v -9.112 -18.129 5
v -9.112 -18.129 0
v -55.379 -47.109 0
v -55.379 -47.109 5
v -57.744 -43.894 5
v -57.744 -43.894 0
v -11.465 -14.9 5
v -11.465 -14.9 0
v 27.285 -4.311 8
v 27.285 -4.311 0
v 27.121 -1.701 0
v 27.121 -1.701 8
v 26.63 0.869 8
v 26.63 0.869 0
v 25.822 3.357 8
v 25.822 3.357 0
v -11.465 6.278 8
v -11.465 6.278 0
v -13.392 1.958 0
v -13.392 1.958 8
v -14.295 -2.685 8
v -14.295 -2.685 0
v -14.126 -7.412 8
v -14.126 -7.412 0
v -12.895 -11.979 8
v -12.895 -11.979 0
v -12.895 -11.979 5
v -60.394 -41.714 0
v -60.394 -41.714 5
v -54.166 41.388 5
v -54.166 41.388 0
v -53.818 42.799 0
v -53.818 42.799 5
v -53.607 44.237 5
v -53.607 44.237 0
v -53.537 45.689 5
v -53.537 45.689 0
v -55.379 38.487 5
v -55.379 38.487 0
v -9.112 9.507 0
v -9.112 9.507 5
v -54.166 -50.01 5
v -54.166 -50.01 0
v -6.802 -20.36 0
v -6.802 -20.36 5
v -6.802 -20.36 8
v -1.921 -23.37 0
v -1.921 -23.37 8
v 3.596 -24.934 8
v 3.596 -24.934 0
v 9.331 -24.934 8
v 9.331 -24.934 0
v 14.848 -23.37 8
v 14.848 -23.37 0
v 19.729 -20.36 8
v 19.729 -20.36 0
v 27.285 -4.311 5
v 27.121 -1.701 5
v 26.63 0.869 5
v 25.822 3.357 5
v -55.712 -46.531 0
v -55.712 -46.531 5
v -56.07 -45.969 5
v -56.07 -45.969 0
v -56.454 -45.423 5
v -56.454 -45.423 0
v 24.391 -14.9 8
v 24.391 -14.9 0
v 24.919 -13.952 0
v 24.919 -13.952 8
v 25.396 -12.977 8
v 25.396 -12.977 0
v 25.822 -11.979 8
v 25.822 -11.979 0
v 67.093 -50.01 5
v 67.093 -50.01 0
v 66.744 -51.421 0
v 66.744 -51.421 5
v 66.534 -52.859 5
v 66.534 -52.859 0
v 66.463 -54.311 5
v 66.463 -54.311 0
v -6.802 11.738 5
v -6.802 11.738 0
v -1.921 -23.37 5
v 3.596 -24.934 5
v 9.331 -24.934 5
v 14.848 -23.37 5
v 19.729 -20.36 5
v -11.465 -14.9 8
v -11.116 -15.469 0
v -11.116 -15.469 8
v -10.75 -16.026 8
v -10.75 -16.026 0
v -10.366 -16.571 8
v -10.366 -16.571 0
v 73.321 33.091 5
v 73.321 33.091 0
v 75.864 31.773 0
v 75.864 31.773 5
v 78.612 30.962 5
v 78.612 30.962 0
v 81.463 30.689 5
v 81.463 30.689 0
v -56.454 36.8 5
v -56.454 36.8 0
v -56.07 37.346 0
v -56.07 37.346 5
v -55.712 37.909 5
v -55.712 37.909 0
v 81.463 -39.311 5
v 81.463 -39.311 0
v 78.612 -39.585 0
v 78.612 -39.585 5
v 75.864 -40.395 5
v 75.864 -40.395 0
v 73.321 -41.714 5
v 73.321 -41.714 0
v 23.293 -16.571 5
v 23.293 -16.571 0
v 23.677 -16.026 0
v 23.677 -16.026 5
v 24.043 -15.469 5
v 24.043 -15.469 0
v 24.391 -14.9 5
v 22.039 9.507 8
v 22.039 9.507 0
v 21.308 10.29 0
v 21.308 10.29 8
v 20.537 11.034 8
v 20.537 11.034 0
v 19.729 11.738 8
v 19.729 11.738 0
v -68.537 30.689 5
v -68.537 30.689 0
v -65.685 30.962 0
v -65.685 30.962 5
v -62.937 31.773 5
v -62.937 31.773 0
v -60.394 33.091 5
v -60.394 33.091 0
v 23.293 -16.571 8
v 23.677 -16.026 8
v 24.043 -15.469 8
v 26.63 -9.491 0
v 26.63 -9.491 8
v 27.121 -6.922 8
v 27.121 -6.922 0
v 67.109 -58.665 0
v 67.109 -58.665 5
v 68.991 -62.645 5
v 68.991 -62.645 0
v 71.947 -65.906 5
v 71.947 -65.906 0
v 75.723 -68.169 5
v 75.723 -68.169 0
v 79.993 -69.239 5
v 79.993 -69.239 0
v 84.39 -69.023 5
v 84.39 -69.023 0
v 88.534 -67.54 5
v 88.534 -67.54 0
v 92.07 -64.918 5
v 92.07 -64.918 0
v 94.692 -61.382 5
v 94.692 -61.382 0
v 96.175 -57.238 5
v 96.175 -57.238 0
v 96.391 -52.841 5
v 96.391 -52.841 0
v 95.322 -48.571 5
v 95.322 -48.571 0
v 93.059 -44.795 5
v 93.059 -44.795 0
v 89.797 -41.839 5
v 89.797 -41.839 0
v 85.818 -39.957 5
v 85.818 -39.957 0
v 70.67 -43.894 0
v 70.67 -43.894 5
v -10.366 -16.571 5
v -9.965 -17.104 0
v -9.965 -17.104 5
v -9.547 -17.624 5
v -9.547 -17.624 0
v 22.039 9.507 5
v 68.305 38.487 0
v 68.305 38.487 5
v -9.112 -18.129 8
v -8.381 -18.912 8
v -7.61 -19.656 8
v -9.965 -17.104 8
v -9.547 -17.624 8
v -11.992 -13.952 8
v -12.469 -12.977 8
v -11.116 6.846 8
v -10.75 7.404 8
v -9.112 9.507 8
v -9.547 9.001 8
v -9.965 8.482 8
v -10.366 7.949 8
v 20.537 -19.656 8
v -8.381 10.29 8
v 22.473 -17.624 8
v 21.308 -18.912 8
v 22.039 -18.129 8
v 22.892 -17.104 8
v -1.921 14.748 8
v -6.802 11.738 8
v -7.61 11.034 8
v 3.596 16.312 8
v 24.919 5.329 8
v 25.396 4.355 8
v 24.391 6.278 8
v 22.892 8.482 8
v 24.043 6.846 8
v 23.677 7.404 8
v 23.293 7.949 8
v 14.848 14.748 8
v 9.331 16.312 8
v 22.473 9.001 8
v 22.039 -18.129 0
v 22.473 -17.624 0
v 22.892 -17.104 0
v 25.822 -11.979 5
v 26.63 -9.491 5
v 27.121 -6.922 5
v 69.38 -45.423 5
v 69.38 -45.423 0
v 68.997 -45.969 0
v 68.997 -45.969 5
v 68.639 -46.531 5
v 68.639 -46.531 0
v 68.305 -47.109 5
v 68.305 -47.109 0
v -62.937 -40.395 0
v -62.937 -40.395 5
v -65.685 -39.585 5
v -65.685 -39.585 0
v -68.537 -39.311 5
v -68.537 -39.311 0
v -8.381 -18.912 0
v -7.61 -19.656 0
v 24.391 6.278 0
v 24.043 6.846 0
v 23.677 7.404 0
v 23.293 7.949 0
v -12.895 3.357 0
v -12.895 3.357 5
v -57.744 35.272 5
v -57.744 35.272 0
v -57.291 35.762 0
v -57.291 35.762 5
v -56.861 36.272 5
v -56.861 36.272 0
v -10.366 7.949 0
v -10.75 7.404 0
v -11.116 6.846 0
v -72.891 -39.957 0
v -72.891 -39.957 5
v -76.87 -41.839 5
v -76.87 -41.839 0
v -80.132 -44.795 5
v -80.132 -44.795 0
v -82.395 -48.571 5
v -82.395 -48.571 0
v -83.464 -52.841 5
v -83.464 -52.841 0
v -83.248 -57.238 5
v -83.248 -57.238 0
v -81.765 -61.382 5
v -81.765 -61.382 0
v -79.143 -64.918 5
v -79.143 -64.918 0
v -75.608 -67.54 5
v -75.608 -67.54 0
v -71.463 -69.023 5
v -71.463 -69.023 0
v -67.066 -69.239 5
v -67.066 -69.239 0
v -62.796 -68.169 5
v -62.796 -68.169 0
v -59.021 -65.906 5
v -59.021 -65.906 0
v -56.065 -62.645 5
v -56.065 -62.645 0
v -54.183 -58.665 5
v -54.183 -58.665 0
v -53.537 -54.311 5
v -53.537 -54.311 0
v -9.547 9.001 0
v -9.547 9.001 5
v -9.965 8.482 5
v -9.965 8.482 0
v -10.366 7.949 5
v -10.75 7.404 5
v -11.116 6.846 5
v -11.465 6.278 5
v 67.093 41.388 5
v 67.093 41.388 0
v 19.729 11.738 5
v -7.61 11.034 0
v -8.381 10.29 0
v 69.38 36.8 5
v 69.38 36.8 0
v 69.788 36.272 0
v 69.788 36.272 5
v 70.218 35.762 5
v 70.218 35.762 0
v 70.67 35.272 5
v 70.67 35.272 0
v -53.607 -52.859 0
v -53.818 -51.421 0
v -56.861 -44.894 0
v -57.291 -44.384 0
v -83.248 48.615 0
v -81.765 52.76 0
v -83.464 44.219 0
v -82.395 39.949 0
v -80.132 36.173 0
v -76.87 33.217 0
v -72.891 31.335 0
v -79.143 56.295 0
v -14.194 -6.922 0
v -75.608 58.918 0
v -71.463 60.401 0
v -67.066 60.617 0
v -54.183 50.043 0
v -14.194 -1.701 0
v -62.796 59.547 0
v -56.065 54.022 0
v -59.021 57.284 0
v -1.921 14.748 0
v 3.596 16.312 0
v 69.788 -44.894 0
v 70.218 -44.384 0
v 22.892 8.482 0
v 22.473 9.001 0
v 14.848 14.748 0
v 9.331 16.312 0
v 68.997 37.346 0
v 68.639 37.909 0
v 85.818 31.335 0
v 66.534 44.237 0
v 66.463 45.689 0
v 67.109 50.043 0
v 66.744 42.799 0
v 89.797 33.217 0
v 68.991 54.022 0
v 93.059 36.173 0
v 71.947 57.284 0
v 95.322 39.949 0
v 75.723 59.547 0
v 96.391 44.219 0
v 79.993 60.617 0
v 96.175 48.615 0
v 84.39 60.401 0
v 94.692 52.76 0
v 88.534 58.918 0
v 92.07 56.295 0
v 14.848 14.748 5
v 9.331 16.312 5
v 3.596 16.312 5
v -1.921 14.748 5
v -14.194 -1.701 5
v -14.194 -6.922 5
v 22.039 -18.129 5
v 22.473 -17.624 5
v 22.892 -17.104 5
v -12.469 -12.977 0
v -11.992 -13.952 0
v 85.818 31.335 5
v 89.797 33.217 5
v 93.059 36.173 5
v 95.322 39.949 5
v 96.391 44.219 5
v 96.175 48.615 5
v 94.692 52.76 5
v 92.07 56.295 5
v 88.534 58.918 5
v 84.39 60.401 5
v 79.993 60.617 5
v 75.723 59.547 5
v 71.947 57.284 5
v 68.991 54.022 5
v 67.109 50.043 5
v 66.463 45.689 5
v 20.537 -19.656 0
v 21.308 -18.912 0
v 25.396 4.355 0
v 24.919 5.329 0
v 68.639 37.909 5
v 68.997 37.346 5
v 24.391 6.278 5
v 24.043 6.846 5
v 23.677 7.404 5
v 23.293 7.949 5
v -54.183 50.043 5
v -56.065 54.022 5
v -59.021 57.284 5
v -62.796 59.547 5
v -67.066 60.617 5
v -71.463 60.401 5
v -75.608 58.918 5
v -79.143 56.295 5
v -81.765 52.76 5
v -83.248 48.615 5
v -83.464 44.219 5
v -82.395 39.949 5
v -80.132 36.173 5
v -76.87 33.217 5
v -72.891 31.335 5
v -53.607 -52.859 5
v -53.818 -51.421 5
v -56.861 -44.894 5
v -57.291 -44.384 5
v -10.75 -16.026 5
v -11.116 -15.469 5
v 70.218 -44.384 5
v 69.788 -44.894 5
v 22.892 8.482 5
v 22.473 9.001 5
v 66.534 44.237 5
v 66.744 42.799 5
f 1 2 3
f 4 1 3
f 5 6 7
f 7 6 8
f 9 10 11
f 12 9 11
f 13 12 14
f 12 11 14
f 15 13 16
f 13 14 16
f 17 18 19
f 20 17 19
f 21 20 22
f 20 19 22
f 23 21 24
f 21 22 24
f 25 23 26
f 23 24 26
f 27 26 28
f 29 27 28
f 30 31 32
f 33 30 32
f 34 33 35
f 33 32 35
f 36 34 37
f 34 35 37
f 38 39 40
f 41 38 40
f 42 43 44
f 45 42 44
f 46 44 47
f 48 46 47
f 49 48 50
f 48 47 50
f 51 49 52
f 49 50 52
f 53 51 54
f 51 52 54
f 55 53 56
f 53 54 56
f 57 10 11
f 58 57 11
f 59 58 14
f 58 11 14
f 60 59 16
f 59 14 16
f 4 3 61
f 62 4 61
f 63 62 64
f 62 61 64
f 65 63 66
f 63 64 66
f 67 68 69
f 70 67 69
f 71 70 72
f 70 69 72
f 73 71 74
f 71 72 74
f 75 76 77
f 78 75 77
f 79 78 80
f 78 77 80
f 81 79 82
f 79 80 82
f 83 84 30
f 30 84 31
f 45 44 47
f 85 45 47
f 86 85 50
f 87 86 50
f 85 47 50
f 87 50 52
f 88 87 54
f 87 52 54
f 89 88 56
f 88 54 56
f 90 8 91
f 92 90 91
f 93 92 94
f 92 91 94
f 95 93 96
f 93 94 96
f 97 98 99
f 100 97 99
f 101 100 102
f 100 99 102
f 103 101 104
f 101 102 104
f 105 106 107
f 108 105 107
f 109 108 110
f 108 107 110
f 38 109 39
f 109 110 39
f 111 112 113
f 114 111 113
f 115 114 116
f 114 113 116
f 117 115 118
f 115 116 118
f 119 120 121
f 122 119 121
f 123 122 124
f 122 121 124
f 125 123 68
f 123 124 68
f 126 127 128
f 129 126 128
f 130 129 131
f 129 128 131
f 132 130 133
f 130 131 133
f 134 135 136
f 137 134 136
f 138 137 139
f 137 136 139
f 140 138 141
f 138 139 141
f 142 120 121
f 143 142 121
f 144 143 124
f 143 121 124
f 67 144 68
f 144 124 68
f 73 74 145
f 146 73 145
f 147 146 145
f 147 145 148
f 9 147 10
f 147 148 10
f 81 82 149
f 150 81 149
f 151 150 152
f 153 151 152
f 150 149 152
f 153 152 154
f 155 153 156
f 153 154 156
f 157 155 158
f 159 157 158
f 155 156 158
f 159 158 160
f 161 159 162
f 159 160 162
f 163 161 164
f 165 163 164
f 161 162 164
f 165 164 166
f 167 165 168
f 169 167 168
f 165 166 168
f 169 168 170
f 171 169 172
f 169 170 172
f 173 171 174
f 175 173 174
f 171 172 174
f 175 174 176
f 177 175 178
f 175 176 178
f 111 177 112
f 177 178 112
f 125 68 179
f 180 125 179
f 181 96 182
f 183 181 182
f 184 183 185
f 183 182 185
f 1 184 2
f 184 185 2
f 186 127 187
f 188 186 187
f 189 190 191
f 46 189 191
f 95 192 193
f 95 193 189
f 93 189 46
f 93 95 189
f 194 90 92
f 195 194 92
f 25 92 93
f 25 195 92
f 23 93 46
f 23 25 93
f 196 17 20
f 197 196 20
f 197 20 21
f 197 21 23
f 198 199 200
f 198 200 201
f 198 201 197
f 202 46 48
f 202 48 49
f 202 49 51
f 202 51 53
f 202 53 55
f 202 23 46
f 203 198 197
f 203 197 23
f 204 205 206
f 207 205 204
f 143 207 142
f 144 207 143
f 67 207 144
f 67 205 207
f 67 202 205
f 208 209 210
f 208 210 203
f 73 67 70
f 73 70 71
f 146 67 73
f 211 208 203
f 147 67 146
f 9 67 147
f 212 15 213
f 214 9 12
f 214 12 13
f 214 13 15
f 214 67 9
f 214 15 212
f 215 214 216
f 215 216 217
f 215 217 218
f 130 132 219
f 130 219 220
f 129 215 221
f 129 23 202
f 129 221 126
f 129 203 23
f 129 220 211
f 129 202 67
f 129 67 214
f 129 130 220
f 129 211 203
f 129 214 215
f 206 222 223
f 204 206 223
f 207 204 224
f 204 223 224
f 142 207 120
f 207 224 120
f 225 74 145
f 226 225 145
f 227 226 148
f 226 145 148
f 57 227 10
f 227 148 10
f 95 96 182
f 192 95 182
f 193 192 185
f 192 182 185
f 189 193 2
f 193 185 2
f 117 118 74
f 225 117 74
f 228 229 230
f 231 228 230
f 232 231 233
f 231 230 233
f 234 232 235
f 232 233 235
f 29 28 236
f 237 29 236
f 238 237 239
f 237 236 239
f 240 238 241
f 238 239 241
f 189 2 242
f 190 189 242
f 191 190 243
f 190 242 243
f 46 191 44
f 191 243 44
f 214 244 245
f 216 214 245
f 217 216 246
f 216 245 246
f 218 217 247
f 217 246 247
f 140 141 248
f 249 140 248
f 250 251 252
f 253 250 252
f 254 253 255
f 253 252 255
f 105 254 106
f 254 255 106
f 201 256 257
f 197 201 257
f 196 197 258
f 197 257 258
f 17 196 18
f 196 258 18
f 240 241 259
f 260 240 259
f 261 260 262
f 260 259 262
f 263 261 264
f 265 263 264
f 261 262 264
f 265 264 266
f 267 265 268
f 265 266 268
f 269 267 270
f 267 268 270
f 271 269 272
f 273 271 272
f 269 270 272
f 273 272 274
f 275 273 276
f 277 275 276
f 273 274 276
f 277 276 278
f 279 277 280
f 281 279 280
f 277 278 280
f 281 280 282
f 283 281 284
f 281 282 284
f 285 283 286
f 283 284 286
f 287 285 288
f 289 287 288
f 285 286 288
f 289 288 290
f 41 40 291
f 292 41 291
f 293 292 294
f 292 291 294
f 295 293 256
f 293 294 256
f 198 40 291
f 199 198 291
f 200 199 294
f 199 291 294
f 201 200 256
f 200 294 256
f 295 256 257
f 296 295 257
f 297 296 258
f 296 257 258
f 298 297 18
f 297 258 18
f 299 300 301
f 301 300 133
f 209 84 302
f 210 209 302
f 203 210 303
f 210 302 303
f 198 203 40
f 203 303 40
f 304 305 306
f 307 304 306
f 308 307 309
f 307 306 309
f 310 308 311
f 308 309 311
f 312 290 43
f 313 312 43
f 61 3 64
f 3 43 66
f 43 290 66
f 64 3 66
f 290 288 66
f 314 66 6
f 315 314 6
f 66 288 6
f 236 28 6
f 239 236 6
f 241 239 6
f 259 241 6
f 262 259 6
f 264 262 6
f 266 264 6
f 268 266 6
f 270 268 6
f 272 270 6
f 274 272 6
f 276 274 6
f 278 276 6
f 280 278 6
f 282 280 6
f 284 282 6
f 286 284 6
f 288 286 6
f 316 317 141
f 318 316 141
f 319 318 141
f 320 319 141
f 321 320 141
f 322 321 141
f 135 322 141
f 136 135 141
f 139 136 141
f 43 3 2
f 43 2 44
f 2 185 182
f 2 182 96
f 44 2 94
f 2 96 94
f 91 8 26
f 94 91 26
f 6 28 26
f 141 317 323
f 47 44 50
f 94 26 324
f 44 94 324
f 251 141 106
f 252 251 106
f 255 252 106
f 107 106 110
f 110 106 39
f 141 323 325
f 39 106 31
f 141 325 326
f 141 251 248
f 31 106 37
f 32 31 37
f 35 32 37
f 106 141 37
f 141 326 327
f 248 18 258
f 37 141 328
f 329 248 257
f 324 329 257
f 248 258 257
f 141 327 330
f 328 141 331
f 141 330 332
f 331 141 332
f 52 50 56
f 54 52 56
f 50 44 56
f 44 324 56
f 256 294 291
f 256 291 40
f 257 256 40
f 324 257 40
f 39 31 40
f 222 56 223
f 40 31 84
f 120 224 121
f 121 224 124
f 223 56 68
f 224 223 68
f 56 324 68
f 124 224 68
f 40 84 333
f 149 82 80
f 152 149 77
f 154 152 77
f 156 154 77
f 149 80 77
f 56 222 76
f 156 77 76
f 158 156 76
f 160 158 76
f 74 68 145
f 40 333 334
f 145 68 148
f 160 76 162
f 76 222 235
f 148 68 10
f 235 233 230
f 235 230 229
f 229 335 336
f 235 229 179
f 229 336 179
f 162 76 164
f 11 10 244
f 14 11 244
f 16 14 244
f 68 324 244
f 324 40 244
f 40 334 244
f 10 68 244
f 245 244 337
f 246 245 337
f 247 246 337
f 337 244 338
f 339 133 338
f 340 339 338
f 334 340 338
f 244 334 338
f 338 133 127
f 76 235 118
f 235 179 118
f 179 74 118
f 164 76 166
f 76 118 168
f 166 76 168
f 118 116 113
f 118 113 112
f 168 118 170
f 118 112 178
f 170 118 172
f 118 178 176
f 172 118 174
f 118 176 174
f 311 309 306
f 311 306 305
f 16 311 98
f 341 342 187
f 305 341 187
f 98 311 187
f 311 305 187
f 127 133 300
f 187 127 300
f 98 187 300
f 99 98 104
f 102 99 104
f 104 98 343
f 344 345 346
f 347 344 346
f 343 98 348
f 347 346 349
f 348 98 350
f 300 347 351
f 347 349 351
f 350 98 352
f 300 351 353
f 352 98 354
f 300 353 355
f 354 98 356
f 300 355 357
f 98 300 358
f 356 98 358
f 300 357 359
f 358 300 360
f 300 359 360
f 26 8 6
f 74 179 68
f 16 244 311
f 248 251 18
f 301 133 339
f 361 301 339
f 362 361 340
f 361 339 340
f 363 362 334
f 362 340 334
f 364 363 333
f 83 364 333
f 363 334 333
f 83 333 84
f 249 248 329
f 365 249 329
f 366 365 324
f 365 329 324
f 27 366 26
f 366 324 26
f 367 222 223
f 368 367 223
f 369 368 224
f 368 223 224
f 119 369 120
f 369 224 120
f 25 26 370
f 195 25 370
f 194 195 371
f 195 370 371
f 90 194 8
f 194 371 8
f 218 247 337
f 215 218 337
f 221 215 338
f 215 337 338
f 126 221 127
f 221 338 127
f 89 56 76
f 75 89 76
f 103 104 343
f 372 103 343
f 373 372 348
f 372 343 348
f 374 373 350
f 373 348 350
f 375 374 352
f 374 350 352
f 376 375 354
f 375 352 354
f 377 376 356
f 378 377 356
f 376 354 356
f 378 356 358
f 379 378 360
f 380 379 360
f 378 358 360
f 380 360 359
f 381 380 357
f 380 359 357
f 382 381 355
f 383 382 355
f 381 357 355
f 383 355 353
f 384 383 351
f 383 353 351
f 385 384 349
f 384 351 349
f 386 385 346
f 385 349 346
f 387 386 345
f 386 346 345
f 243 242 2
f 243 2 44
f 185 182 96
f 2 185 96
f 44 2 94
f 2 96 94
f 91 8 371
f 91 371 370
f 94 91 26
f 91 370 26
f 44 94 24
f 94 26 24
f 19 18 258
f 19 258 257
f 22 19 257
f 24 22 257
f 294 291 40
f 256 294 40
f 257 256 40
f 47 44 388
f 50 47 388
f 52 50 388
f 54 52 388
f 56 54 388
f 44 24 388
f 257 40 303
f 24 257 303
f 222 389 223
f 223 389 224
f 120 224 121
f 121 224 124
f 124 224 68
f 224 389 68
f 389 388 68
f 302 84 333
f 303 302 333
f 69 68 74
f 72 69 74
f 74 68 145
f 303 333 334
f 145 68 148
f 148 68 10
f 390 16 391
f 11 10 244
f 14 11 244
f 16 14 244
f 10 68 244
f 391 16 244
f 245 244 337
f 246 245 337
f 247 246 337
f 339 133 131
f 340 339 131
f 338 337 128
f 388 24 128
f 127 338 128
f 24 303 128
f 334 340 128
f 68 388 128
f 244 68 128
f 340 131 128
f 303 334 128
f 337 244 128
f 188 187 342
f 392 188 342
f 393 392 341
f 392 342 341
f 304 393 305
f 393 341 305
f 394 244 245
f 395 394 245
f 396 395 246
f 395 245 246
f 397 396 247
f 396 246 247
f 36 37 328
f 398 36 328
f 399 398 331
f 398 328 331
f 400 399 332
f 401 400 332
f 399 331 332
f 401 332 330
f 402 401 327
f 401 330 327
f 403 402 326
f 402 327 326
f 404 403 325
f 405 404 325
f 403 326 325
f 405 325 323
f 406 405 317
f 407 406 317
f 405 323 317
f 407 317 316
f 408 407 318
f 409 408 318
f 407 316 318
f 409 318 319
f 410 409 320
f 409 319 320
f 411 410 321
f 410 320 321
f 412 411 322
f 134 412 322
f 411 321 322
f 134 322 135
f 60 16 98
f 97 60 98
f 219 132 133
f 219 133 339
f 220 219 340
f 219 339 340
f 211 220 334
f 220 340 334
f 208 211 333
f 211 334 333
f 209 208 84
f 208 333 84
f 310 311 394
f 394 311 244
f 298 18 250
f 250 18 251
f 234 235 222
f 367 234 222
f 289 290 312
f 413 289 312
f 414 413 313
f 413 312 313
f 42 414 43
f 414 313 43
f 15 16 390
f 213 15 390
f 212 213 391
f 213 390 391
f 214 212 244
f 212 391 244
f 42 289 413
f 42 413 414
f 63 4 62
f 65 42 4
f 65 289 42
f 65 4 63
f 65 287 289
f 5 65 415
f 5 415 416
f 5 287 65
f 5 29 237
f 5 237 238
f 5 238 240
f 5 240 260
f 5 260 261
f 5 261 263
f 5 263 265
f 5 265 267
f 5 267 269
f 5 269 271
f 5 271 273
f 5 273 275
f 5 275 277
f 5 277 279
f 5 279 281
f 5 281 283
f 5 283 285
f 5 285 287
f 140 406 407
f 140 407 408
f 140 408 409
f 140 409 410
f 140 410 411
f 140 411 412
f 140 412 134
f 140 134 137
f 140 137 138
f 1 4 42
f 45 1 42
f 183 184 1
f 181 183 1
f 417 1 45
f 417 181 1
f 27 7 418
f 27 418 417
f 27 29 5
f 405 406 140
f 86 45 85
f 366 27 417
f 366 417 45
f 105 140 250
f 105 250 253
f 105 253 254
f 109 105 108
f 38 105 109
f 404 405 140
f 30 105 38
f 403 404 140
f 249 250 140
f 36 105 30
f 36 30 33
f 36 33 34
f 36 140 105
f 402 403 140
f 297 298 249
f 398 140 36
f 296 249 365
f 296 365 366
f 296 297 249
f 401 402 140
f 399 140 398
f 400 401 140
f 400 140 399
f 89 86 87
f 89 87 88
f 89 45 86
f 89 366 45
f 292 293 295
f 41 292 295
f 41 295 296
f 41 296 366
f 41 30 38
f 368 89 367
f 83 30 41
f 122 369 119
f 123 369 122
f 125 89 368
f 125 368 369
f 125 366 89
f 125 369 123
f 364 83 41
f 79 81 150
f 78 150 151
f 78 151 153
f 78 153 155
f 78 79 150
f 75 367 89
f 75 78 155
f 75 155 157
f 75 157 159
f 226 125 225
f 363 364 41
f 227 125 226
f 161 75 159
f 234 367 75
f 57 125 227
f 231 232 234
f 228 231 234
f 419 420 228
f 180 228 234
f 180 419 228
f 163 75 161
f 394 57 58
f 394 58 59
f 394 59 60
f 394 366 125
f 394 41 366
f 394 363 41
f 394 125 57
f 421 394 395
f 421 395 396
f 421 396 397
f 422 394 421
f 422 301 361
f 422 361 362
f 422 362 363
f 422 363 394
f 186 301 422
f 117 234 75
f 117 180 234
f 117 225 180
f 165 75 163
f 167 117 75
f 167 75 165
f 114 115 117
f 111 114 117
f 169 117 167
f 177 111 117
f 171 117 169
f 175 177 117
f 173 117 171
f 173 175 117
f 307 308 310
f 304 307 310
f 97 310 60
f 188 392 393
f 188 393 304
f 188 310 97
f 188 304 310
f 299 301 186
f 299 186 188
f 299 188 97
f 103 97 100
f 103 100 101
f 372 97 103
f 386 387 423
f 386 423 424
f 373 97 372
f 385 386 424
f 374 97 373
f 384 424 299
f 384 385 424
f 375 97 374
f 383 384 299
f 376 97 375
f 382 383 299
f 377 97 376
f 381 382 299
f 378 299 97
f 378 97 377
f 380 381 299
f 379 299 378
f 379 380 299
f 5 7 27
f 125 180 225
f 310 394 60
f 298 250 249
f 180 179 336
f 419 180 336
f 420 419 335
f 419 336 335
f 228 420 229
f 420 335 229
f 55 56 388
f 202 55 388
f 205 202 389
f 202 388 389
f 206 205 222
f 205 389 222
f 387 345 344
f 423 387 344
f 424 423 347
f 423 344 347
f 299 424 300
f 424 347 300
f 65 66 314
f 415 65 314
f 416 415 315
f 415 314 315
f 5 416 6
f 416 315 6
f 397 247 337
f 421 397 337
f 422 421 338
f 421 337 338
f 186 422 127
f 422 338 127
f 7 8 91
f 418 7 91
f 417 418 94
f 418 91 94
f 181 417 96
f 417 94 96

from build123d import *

# Parameters (mm, degrees)
F1_DEPTH = 8
F2_DEPTH = 5


with BuildPart() as f1:
    # F0 (on Top) → F1 (new body)
    with BuildSketch(Plane.XY):
        with BuildLine():
            ThreePointArc((25.8218274264, -11.9788249413), (26.9159887383, -8.214169835), (27.285070702, -4.3111459369))
            ThreePointArc((27.285070702, -4.3111459369), (26.9159887383, -0.4081220387), (25.8218274264, 3.3565330675))
            ThreePointArc((25.8218274264, 3.3565330675), (25.163790077, 4.8451330019), (24.3914933518, 6.2777881196))
            ThreePointArc((24.3914933518, 6.2777881196), (23.8622519529, 7.1265995546), (23.2928555336, 7.9490137011))
            ThreePointArc((23.2928555336, 7.9490137011), (22.6846182097, 8.7431325011), (22.0389437384, 9.5071231998))
            ThreePointArc((22.0389437384, 9.5071231998), (20.9271256495, 10.6669312969), (19.7291910596, 11.7375605526))
            ThreePointArc((19.7291910596, 11.7375605526), (6.463385336, 16.5105394291), (-6.8024203875, 11.7375605526))
            ThreePointArc((-6.8024203875, 11.7375605526), (-8.0003549775, 10.6669312969), (-9.1121730663, 9.5071231998))
            ThreePointArc((-9.1121730663, 9.5071231998), (-9.7578475377, 8.7431325011), (-10.3660848615, 7.9490137011))
            ThreePointArc((-10.3660848615, 7.9490137011), (-10.9354812808, 7.1265995546), (-11.4647226798, 6.2777881196))
            ThreePointArc((-11.4647226798, 6.2777881196), (-12.2370194049, 4.8451330019), (-12.8950567543, 3.3565330675))
            ThreePointArc((-12.8950567543, 3.3565330675), (-14.3583000299, -4.3111459369), (-12.8950567543, -11.9788249413))
            ThreePointArc((-12.8950567543, -11.9788249413), (-12.2370194049, -13.4674248757), (-11.4647226798, -14.9000799934))
            ThreePointArc((-11.4647226798, -14.9000799934), (-10.9354812808, -15.7488914284), (-10.3660848615, -16.5713055749))
            ThreePointArc((-10.3660848615, -16.5713055749), (-9.7578475377, -17.3654243749), (-9.1121730663, -18.1294150736))
            ThreePointArc((-9.1121730663, -18.1294150736), (-8.0003549775, -19.2892231707), (-6.8024203875, -20.3598524263))
            ThreePointArc((-6.8024203875, -20.3598524263), (6.463385336, -25.1328313029), (19.7291910596, -20.3598524263))
            ThreePointArc((19.7291910596, -20.3598524263), (20.9271256495, -19.2892231707), (22.0389437384, -18.1294150736))
            ThreePointArc((22.0389437384, -18.1294150736), (22.6846182097, -17.3654243749), (23.2928555336, -16.5713055749))
            ThreePointArc((23.2928555336, -16.5713055749), (23.8622519529, -15.7488914284), (24.3914933518, -14.9000799934))
            ThreePointArc((24.3914933518, -14.9000799934), (25.163790077, -13.4674248757), (25.8218274264, -11.9788249413))
        make_face()
    extrude(amount=F1_DEPTH)


with BuildPart() as f2:
    # F0 (on Top) → F2 (new body)
    with BuildSketch(Plane.XY):
        with BuildLine():
            ThreePointArc((24.3914933518, 6.2777881196), (25.163790077, 4.8451330019), (25.8218274264, 3.3565330675))
            Line((25.8218274264, 3.3565330675), (73.3206508225, 33.0913989772))
            ThreePointArc((73.3206508225, 33.0913989772), (71.9329417181, 34.105648788), (70.6703753539, 35.2719958263))
            Line((70.6703753539, 35.2719958263), (24.3914933518, 6.2777881196))
        make_face()
        with BuildLine():
            ThreePointArc((19.7291910596, 11.7375605526), (20.9271256495, 10.6669312969), (22.0389437384, 9.5071231998))
            Line((22.0389437384, 9.5071231998), (68.3054091022, 38.4869333867))
            ThreePointArc((68.3054091022, 38.4869333867), (67.6230720145, 39.9056259712), (67.0931796762, 41.38801818))
            Line((67.0931796762, 41.38801818), (19.7291910596, 11.7375605526))
        make_face()
        with BuildLine():
            Line((81.463385336, 38.1888540631), (81.463385336, 30.6888540631))
            ThreePointArc((81.463385336, 30.6888540631), (92.0699870538, 35.0822523453), (96.463385336, 45.6888540631))
            ThreePointArc((96.463385336, 45.6888540631), (81.463385336, 60.6888540631), (66.463385336, 45.6888540631))
            Line((66.463385336, 45.6888540631), (73.963385336, 45.6888540631))
            Line((73.963385336, 45.6888540631), (81.463385336, 45.6888540631))
            Line((81.463385336, 45.6888540631), (81.463385336, 38.1888540631))
        make_face()
        with BuildLine():
            ThreePointArc((70.6703753539, 35.2719958263), (71.9329417181, 34.105648788), (73.3206508225, 33.0913989772))
            Line((73.3206508225, 33.0913989772), (81.463385336, 38.1888540631))
            Line((81.463385336, 38.1888540631), (81.463385336, 45.6888540631))
            Line((81.463385336, 45.6888540631), (73.963385336, 45.6888540631))
            Line((73.963385336, 45.6888540631), (67.0931796762, 41.38801818))
            ThreePointArc((67.0931796762, 41.38801818), (67.6230720145, 39.9056259712), (68.3054091022, 38.4869333867))
            ThreePointArc((68.3054091022, 38.4869333867), (68.8148096557, 37.6257570614), (69.3804887024, 36.8004566293))
            ThreePointArc((69.3804887024, 36.8004566293), (69.9999293135, 36.0147041769), (70.6703753539, 35.2719958263))
        make_face()
        with BuildLine():
            Line((81.463385336, 38.1888540631), (73.3206508225, 33.0913989772))
            ThreePointArc((73.3206508225, 33.0913989772), (77.2184958374, 31.3020228225), (81.463385336, 30.6888540631))
            Line((81.463385336, 30.6888540631), (81.463385336, 38.1888540631))
        make_face()
        with BuildLine():
            Line((73.963385336, 45.6888540631), (66.463385336, 45.6888540631))
            ThreePointArc((66.463385336, 45.6888540631), (66.6216690455, 43.5155023771), (67.0931796762, 41.38801818))
            Line((67.0931796762, 41.38801818), (73.963385336, 45.6888540631))
        make_face()
        with BuildLine():
            Line((-61.036614664, 45.6888540631), (-53.536614664, 45.6888540631))
            ThreePointArc((-53.536614664, 45.6888540631), (-79.1432163818, 56.2954557809), (-68.536614664, 30.6888540631))
            Line((-68.536614664, 30.6888540631), (-68.536614664, 38.1888540631))
            Line((-68.536614664, 38.1888540631), (-68.536614664, 45.6888540631))
            Line((-68.536614664, 45.6888540631), (-61.036614664, 45.6888540631))
        make_face()
        with BuildLine():
            ThreePointArc((-55.3786384301, 38.4869333867), (-54.6963013425, 39.9056259712), (-54.1664090041, 41.38801818))
            Line((-54.1664090041, 41.38801818), (-61.036614664, 45.6888540631))
            Line((-61.036614664, 45.6888540631), (-68.536614664, 45.6888540631))
            Line((-68.536614664, 45.6888540631), (-68.536614664, 38.1888540631))
            Line((-68.536614664, 38.1888540631), (-60.3938801505, 33.0913989772))
            ThreePointArc((-60.3938801505, 33.0913989772), (-59.006171046, 34.105648788), (-57.7436046819, 35.2719958263))
            ThreePointArc((-57.7436046819, 35.2719958263), (-57.0731586415, 36.0147041769), (-56.4537180304, 36.8004566293))
            ThreePointArc((-56.4537180304, 36.8004566293), (-55.8880389836, 37.6257570614), (-55.3786384301, 38.4869333867))
        make_face()
        with BuildLine():
            ThreePointArc((-54.1664090041, 41.38801818), (-53.6948983734, 43.5155023771), (-53.536614664, 45.6888540631))
            Line((-53.536614664, 45.6888540631), (-61.036614664, 45.6888540631))
            Line((-61.036614664, 45.6888540631), (-54.1664090041, 41.38801818))
        make_face()
        with BuildLine():
            Line((-68.536614664, 38.1888540631), (-68.536614664, 30.6888540631))
            ThreePointArc((-68.536614664, 30.6888540631), (-64.2917251654, 31.3020228225), (-60.3938801505, 33.0913989772))
            Line((-60.3938801505, 33.0913989772), (-68.536614664, 38.1888540631))
        make_face()
        with BuildLine():
            ThreePointArc((-57.7436046819, 35.2719958263), (-59.006171046, 34.105648788), (-60.3938801505, 33.0913989772))
            Line((-60.3938801505, 33.0913989772), (-12.8950567543, 3.3565330675))
            ThreePointArc((-12.8950567543, 3.3565330675), (-12.2370194049, 4.8451330019), (-11.4647226798, 6.2777881196))
            Line((-11.4647226798, 6.2777881196), (-57.7436046819, 35.2719958263))
        make_face()
        with BuildLine():
            ThreePointArc((-9.1121730663, 9.5071231998), (-8.0003549775, 10.6669312969), (-6.8024203875, 11.7375605526))
            Line((-6.8024203875, 11.7375605526), (-54.1664090041, 41.38801818))
            ThreePointArc((-54.1664090041, 41.38801818), (-54.6963013425, 39.9056259712), (-55.3786384301, 38.4869333867))
            Line((-55.3786384301, 38.4869333867), (-9.1121730663, 9.5071231998))
        make_face()
        with BuildLine():
            ThreePointArc((25.8218274264, -11.9788249413), (26.9159887383, -8.214169835), (27.285070702, -4.3111459369))
            ThreePointArc((27.285070702, -4.3111459369), (26.9159887383, -0.4081220387), (25.8218274264, 3.3565330675))
            ThreePointArc((25.8218274264, 3.3565330675), (25.163790077, 4.8451330019), (24.3914933518, 6.2777881196))
            ThreePointArc((24.3914933518, 6.2777881196), (23.8622519529, 7.1265995546), (23.2928555336, 7.9490137011))
            ThreePointArc((23.2928555336, 7.9490137011), (22.6846182097, 8.7431325011), (22.0389437384, 9.5071231998))
            ThreePointArc((22.0389437384, 9.5071231998), (20.9271256495, 10.6669312969), (19.7291910596, 11.7375605526))
            ThreePointArc((19.7291910596, 11.7375605526), (6.463385336, 16.5105394291), (-6.8024203875, 11.7375605526))
            ThreePointArc((-6.8024203875, 11.7375605526), (-8.0003549775, 10.6669312969), (-9.1121730663, 9.5071231998))
            ThreePointArc((-9.1121730663, 9.5071231998), (-9.7578475377, 8.7431325011), (-10.3660848615, 7.9490137011))
            ThreePointArc((-10.3660848615, 7.9490137011), (-10.9354812808, 7.1265995546), (-11.4647226798, 6.2777881196))
            ThreePointArc((-11.4647226798, 6.2777881196), (-12.2370194049, 4.8451330019), (-12.8950567543, 3.3565330675))
            ThreePointArc((-12.8950567543, 3.3565330675), (-14.3583000299, -4.3111459369), (-12.8950567543, -11.9788249413))
            ThreePointArc((-12.8950567543, -11.9788249413), (-12.2370194049, -13.4674248757), (-11.4647226798, -14.9000799934))
            ThreePointArc((-11.4647226798, -14.9000799934), (-10.9354812808, -15.7488914284), (-10.3660848615, -16.5713055749))
            ThreePointArc((-10.3660848615, -16.5713055749), (-9.7578475377, -17.3654243749), (-9.1121730663, -18.1294150736))
            ThreePointArc((-9.1121730663, -18.1294150736), (-8.0003549775, -19.2892231707), (-6.8024203875, -20.3598524263))
            ThreePointArc((-6.8024203875, -20.3598524263), (6.463385336, -25.1328313029), (19.7291910596, -20.3598524263))
            ThreePointArc((19.7291910596, -20.3598524263), (20.9271256495, -19.2892231707), (22.0389437384, -18.1294150736))
            ThreePointArc((22.0389437384, -18.1294150736), (22.6846182097, -17.3654243749), (23.2928555336, -16.5713055749))
            ThreePointArc((23.2928555336, -16.5713055749), (23.8622519529, -15.7488914284), (24.3914933518, -14.9000799934))
            ThreePointArc((24.3914933518, -14.9000799934), (25.163790077, -13.4674248757), (25.8218274264, -11.9788249413))
        make_face()
        with BuildLine():
            Line((-12.8950567543, -11.9788249413), (-60.3938801505, -41.7136908509))
            ThreePointArc((-60.3938801505, -41.7136908509), (-59.006171046, -42.7279406618), (-57.7436046819, -43.8942877001))
            Line((-57.7436046819, -43.8942877001), (-11.4647226798, -14.9000799934))
            ThreePointArc((-11.4647226798, -14.9000799934), (-12.2370194049, -13.4674248757), (-12.8950567543, -11.9788249413))
        make_face()
        with BuildLine():
            Line((-54.1664090041, -50.0103100538), (-6.8024203875, -20.3598524263))
            ThreePointArc((-6.8024203875, -20.3598524263), (-8.0003549775, -19.2892231707), (-9.1121730663, -18.1294150736))
            Line((-9.1121730663, -18.1294150736), (-55.3786384301, -47.1092252605))
            ThreePointArc((-55.3786384301, -47.1092252605), (-54.6963013425, -48.527917845), (-54.1664090041, -50.0103100538))
        make_face()
        with BuildLine():
            Line((68.3054091022, -47.1092252605), (22.0389437384, -18.1294150736))
            ThreePointArc((22.0389437384, -18.1294150736), (20.9271256495, -19.2892231707), (19.7291910596, -20.3598524263))
            Line((19.7291910596, -20.3598524263), (67.0931796762, -50.0103100538))
            ThreePointArc((67.0931796762, -50.0103100538), (67.6230720145, -48.527917845), (68.3054091022, -47.1092252605))
        make_face()
        with BuildLine():
            Line((73.3206508225, -41.713690851), (25.8218274264, -11.9788249413))
            ThreePointArc((25.8218274264, -11.9788249413), (25.163790077, -13.4674248757), (24.3914933518, -14.9000799934))
            Line((24.3914933518, -14.9000799934), (70.6703753539, -43.8942877001))
            ThreePointArc((70.6703753539, -43.8942877001), (71.9329417181, -42.7279406618), (73.3206508225, -41.7136908509))
        make_face()
        with BuildLine():
            ThreePointArc((96.463385336, -54.3111459369), (92.0699870538, -43.7045442191), (81.463385336, -39.3111459369))
            Line((81.463385336, -39.3111459369), (81.463385336, -46.8111459369))
            Line((81.463385336, -46.8111459369), (81.463385336, -54.3111459369))
            Line((81.463385336, -54.3111459369), (73.963385336, -54.3111459369))
            Line((73.963385336, -54.3111459369), (66.463385336, -54.3111459369))
            ThreePointArc((66.463385336, -54.3111459369), (81.463385336, -69.3111459369), (96.463385336, -54.3111459369))
        make_face()
        with BuildLine():
            Line((81.463385336, -46.8111459369), (73.3206508225, -41.713690851))
            ThreePointArc((73.3206508225, -41.7136908509), (71.9329417181, -42.7279406618), (70.6703753539, -43.8942877001))
            ThreePointArc((70.6703753539, -43.8942877001), (69.9999293135, -44.6369960507), (69.3804887024, -45.4227485031))
            ThreePointArc((69.3804887024, -45.4227485031), (68.8148096557, -46.2480489352), (68.3054091022, -47.1092252605))
            ThreePointArc((68.3054091022, -47.1092252605), (67.6230720145, -48.527917845), (67.0931796762, -50.0103100538))
            Line((67.0931796762, -50.0103100538), (73.963385336, -54.3111459369))
            Line((73.963385336, -54.3111459369), (81.463385336, -54.3111459369))
            Line((81.463385336, -54.3111459369), (81.463385336, -46.8111459369))
        make_face()
        with BuildLine():
            ThreePointArc((81.463385336, -39.3111459369), (77.2184958374, -39.9243146963), (73.3206508225, -41.7136908509))
            Line((73.3206508225, -41.713690851), (81.463385336, -46.8111459369))
            Line((81.463385336, -46.8111459369), (81.463385336, -39.3111459369))
        make_face()
        with BuildLine():
            ThreePointArc((67.0931796762, -50.0103100538), (66.6216690455, -52.1377942509), (66.463385336, -54.3111459369))
            Line((66.463385336, -54.3111459369), (73.963385336, -54.3111459369))
            Line((73.963385336, -54.3111459369), (67.0931796762, -50.0103100538))
        make_face()
        with BuildLine():
            ThreePointArc((-68.536614664, -39.3111459369), (-79.1432163818, -64.9177476547), (-53.536614664, -54.3111459369))
            Line((-53.536614664, -54.3111459369), (-61.036614664, -54.3111459369))
            Line((-61.036614664, -54.3111459369), (-68.536614664, -54.3111459369))
            Line((-68.536614664, -54.3111459369), (-68.536614664, -46.8111459369))
            Line((-68.536614664, -46.8111459369), (-68.536614664, -39.3111459369))
        make_face()
        with BuildLine():
            Line((-61.036614664, -54.3111459369), (-54.1664090041, -50.0103100538))
            ThreePointArc((-54.1664090041, -50.0103100538), (-54.6963013425, -48.527917845), (-55.3786384301, -47.1092252605))
            ThreePointArc((-55.3786384301, -47.1092252605), (-55.8880389836, -46.2480489352), (-56.4537180304, -45.4227485031))
            ThreePointArc((-56.4537180304, -45.4227485031), (-57.0731586415, -44.6369960507), (-57.7436046819, -43.8942877001))
            ThreePointArc((-57.7436046819, -43.8942877001), (-59.006171046, -42.7279406618), (-60.3938801505, -41.7136908509))
            Line((-60.3938801505, -41.7136908509), (-68.536614664, -46.8111459369))
            Line((-68.536614664, -46.8111459369), (-68.536614664, -54.3111459369))
            Line((-68.536614664, -54.3111459369), (-61.036614664, -54.3111459369))
        make_face()
        with BuildLine():
            ThreePointArc((-60.3938801505, -41.7136908509), (-64.2917251654, -39.9243146963), (-68.536614664, -39.3111459369))
            Line((-68.536614664, -39.3111459369), (-68.536614664, -46.8111459369))
            Line((-68.536614664, -46.8111459369), (-60.3938801505, -41.7136908509))
        make_face()
        with BuildLine():
            Line((-61.036614664, -54.3111459369), (-53.536614664, -54.3111459369))
            ThreePointArc((-53.536614664, -54.3111459369), (-53.6948983734, -52.1377942509), (-54.1664090041, -50.0103100538))
            Line((-54.1664090041, -50.0103100538), (-61.036614664, -54.3111459369))
        make_face()
    extrude(amount=F2_DEPTH)


solid = Compound([f1.part, f2.part])
